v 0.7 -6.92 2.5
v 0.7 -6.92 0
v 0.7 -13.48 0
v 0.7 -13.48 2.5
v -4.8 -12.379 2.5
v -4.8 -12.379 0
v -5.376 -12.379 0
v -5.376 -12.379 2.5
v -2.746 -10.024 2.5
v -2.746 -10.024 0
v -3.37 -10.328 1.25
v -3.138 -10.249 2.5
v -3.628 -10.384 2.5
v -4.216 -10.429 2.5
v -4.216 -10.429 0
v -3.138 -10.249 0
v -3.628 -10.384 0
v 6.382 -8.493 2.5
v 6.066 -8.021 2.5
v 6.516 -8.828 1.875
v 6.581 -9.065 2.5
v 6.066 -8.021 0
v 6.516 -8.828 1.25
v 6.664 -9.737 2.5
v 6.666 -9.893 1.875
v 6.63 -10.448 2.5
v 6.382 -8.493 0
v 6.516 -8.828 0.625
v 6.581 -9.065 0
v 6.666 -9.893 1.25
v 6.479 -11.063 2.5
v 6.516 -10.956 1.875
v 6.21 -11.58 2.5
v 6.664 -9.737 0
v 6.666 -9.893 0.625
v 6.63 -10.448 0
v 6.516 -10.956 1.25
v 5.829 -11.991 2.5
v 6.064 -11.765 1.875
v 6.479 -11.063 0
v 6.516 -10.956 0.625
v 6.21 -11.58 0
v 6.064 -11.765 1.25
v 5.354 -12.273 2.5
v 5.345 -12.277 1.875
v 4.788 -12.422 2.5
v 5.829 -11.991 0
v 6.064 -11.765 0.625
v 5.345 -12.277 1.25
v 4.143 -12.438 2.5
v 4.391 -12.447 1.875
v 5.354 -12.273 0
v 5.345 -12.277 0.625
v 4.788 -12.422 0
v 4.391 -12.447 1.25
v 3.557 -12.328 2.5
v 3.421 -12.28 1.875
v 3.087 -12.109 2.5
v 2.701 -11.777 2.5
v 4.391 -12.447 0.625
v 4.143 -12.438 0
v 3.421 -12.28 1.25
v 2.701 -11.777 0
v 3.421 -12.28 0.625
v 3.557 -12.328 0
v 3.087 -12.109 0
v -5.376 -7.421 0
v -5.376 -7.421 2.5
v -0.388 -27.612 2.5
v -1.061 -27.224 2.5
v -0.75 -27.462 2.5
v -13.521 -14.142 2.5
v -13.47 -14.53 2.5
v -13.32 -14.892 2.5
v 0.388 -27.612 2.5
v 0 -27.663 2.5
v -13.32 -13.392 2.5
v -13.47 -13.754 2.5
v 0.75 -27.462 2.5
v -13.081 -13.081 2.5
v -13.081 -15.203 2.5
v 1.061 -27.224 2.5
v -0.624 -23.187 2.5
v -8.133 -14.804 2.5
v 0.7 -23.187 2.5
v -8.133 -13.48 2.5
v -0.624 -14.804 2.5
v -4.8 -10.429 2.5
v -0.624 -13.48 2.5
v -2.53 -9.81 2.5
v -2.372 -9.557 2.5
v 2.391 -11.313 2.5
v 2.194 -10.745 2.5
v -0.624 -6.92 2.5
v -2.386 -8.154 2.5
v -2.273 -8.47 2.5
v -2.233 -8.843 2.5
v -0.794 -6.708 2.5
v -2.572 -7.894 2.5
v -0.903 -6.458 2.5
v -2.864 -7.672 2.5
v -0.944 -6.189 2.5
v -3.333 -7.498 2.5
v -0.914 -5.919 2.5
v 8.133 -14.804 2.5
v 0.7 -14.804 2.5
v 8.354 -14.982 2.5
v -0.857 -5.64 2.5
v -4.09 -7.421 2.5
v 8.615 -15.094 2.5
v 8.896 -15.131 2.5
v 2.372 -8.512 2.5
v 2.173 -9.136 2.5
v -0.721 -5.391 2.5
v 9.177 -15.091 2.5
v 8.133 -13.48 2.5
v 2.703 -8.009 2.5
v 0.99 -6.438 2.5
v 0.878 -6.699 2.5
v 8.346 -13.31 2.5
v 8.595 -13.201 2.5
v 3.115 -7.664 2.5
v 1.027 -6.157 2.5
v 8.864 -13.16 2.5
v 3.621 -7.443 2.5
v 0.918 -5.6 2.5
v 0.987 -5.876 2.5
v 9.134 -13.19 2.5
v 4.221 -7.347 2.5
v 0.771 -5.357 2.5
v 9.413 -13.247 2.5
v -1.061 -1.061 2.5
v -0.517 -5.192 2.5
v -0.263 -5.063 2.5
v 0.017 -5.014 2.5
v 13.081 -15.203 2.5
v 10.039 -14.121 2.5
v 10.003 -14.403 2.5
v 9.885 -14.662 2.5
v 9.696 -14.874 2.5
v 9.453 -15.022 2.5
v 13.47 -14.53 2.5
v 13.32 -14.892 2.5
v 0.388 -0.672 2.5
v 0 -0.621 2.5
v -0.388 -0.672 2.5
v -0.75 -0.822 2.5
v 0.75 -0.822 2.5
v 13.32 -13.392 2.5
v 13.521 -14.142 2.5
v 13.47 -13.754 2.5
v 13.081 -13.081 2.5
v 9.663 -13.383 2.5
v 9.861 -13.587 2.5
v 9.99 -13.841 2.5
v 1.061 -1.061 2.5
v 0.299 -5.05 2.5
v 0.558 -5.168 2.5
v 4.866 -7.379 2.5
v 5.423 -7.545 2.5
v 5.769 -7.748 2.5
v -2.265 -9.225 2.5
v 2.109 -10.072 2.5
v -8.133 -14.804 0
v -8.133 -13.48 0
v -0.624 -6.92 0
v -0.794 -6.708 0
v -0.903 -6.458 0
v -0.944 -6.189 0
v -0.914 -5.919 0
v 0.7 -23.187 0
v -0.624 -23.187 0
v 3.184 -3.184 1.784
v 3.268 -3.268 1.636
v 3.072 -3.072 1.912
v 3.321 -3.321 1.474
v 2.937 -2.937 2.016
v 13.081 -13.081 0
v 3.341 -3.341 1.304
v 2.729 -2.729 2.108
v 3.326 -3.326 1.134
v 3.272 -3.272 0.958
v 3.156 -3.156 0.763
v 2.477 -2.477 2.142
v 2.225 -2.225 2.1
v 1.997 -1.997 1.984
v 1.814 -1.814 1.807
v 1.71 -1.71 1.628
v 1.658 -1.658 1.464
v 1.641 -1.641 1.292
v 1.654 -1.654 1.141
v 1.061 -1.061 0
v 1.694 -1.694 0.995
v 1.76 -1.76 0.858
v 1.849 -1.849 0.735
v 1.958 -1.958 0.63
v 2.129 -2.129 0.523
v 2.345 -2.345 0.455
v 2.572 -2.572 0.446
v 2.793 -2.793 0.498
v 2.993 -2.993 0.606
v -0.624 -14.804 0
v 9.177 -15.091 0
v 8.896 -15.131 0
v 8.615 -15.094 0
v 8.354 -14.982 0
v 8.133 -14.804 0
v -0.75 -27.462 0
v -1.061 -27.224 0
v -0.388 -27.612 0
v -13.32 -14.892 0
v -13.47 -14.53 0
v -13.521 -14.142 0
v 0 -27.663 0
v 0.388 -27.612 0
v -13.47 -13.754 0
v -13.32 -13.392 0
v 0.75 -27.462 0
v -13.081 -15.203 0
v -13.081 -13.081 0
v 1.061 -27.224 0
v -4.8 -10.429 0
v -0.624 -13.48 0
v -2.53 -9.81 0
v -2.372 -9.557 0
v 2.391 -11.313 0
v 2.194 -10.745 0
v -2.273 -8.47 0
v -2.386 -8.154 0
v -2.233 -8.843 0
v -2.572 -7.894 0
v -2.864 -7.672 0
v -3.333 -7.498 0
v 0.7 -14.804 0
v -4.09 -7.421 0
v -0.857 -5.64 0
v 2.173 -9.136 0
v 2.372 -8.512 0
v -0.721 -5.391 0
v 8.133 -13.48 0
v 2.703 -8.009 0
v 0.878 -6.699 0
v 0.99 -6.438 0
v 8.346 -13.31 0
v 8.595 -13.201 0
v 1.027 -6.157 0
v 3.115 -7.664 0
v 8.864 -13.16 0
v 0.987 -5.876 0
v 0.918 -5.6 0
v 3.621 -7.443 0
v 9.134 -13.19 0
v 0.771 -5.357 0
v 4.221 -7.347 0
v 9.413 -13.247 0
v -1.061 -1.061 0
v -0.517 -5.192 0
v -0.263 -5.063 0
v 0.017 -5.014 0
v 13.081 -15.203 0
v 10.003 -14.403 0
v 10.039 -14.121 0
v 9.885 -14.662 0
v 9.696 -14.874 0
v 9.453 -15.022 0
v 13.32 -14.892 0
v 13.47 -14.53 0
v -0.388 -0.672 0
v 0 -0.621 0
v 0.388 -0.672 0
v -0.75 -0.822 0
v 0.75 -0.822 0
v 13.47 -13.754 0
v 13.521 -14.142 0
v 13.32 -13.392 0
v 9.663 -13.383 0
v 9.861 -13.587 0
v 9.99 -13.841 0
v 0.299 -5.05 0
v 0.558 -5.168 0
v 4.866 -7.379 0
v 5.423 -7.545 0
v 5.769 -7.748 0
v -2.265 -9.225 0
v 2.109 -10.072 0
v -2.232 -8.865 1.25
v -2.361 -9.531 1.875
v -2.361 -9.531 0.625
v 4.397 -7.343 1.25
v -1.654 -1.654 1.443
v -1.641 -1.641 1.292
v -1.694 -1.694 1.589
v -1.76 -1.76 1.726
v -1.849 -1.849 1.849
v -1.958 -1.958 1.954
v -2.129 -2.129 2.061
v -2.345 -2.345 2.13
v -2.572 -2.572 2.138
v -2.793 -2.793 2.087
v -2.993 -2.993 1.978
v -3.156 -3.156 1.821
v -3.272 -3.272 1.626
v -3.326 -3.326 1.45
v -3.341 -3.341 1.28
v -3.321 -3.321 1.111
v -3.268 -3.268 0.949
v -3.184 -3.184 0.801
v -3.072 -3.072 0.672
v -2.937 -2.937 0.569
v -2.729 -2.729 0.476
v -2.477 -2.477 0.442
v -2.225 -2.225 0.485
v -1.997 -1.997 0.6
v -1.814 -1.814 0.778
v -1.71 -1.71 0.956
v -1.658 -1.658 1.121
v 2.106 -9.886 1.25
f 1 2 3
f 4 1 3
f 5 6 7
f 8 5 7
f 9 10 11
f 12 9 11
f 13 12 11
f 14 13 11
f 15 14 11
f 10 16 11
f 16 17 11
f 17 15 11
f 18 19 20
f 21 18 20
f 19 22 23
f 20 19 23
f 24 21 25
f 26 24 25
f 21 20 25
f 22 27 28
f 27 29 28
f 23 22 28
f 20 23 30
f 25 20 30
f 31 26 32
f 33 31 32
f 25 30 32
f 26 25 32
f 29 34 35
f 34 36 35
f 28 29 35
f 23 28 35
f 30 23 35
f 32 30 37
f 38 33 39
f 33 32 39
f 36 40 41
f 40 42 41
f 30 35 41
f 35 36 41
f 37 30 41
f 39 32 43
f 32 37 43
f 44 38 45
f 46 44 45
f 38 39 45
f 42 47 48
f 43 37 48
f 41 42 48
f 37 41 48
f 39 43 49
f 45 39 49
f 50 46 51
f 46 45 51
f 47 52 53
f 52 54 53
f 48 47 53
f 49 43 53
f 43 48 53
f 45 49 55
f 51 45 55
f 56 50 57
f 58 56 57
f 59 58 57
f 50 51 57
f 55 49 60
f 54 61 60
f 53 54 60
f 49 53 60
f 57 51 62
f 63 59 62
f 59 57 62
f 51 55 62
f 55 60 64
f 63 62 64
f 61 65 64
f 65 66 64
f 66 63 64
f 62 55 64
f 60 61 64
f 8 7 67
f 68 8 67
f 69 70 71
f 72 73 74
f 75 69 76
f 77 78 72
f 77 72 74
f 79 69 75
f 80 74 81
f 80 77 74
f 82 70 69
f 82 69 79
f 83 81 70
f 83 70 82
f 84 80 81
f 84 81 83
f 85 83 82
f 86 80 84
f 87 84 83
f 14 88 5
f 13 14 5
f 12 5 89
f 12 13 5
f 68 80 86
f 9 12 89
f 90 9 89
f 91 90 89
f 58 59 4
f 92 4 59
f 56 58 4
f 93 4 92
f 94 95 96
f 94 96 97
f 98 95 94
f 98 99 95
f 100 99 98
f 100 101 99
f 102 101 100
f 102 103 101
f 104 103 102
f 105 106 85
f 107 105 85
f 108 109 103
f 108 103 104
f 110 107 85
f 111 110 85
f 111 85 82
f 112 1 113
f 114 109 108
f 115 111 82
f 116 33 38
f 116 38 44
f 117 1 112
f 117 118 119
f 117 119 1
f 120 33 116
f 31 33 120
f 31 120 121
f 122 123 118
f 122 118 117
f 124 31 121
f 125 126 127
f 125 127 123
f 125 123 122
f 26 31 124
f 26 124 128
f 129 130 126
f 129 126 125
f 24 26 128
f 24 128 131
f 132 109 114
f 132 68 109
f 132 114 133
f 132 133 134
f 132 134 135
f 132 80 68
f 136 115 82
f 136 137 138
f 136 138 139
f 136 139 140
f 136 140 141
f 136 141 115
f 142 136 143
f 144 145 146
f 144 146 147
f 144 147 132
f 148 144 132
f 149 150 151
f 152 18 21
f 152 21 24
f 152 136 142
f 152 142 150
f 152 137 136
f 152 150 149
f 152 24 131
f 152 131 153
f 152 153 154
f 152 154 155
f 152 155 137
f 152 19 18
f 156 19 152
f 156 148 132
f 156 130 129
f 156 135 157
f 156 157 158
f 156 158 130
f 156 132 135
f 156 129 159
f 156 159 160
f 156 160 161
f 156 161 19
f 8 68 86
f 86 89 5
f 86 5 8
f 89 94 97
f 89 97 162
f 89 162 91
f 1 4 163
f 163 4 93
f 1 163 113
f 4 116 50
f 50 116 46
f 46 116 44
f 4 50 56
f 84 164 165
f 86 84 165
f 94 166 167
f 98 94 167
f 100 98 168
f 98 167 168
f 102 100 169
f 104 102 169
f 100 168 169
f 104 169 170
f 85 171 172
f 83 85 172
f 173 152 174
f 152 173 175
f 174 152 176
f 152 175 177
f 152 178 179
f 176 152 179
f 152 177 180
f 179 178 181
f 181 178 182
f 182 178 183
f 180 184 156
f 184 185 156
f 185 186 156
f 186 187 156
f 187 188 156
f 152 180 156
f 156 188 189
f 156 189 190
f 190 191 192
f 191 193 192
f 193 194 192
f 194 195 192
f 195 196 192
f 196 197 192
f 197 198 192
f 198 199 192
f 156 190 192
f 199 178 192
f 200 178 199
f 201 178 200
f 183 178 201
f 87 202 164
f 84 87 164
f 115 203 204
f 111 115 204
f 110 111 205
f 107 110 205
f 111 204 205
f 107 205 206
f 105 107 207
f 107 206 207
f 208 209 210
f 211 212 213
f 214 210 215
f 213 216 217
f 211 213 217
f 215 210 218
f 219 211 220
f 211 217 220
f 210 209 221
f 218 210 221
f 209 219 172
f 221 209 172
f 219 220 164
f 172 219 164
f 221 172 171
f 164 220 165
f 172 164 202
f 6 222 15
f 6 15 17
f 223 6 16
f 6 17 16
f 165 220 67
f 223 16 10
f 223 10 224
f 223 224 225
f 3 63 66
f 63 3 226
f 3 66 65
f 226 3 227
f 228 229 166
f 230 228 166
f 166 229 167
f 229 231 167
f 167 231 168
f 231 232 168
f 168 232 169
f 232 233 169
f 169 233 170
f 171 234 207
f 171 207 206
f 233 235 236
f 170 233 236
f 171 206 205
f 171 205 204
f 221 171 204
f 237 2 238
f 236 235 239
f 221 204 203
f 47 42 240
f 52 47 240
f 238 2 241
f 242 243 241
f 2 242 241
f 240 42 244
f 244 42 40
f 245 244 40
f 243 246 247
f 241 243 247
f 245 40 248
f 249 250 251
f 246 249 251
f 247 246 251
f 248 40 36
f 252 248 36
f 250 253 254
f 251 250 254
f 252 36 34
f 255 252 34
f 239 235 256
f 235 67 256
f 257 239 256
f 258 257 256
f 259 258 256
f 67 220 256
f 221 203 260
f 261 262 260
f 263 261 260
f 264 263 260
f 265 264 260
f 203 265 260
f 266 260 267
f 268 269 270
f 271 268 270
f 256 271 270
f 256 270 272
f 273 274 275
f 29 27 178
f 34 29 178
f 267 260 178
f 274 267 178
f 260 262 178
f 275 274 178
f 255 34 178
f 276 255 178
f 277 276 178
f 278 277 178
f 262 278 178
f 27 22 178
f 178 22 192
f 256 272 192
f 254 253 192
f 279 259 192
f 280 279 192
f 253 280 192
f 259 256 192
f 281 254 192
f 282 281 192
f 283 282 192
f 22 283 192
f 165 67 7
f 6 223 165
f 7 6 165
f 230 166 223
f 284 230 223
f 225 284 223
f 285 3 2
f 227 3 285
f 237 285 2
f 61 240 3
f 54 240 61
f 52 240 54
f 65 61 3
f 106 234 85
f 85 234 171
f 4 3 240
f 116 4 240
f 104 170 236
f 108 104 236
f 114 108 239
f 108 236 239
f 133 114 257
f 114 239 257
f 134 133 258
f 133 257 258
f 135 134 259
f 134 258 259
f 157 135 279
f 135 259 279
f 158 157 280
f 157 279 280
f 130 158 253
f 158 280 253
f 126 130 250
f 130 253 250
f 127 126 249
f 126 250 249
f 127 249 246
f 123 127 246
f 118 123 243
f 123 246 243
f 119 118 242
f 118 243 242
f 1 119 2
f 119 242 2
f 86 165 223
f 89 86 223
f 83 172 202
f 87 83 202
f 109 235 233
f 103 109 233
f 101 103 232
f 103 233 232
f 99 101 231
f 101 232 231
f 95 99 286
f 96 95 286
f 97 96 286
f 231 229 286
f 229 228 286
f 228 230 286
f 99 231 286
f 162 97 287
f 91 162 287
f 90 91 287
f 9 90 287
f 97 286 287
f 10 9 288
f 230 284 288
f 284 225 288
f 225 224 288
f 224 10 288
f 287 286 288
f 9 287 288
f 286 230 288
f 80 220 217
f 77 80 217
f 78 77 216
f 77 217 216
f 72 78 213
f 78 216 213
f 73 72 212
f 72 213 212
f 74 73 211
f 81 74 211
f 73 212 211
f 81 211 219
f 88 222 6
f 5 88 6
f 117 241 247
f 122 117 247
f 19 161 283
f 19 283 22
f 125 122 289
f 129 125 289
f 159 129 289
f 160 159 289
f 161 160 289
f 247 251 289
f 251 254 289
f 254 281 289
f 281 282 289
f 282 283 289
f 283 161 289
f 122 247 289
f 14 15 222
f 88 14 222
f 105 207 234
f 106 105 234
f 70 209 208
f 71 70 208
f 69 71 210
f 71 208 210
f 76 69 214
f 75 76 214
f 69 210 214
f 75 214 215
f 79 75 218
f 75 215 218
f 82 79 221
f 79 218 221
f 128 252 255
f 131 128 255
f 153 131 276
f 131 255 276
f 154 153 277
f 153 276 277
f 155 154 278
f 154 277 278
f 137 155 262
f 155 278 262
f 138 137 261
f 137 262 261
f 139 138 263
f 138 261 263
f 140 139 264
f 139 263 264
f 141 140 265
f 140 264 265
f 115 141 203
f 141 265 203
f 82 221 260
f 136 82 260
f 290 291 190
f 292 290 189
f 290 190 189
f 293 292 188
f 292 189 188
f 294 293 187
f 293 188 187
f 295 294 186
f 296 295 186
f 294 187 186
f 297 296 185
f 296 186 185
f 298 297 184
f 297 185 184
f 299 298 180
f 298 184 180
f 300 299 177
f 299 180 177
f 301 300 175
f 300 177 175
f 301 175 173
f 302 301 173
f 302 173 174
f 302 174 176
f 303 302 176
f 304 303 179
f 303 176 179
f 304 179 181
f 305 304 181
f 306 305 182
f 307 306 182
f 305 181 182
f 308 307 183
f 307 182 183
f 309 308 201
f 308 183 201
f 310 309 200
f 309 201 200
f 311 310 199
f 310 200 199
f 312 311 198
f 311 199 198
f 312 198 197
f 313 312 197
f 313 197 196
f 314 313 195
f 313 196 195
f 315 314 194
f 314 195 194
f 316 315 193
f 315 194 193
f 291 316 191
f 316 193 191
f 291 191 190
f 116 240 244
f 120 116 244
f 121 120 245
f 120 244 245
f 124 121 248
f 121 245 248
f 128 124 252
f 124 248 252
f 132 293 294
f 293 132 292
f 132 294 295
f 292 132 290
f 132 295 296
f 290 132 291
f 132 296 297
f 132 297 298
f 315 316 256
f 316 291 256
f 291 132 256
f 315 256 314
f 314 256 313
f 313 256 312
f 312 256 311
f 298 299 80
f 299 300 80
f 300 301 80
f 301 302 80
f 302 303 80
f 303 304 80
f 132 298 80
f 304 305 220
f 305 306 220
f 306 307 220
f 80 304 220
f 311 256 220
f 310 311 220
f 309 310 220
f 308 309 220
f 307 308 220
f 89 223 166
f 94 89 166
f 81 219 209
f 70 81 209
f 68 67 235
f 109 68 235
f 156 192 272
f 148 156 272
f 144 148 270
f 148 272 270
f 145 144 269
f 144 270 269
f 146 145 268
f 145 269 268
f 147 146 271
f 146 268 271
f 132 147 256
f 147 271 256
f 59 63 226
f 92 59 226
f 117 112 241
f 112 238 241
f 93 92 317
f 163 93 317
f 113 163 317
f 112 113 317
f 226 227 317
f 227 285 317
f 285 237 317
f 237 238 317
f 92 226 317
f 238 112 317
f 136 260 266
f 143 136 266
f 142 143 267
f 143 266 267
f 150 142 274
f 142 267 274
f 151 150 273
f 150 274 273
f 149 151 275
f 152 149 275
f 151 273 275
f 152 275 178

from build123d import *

# Parameters (mm, degrees)
F1_DEPTH = 2.5
F2_R     = 0.85
F3_DEPTH = 12.5


with BuildPart() as f1:
    # F0 (on Top) → F1 (new body)
    with BuildSketch(Plane.XY):
        with BuildLine():
            Line((13.081475452, -13.081475452), (1.0606601718, -1.0606601718))
            ThreePointArc((1.0606601718, -1.0606601718), (0, -0.6213203436), (-1.0606601718, -1.0606601718))
            Line((-1.0606601718, -1.0606601718), (-13.081475452, -13.081475452))
            ThreePointArc((-13.081475452, -13.081475452), (-13.5208152802, -14.1421356237), (-13.081475452, -15.2027957955))
            Line((-13.081475452, -15.2027957955), (-1.0606601718, -27.2236110757))
            ThreePointArc((-1.0606601718, -27.2236110757), (0, -27.6629509039), (1.0606601718, -27.2236110757))
            Line((1.0606601718, -27.2236110757), (13.081475452, -15.2027957955))
            ThreePointArc((13.081475452, -15.2027957955), (13.5208152802, -14.1421356237), (13.081475452, -13.081475452))
        make_face()
        with BuildLine():
            add(Edge.make_bspline(
                [(-4.0900345447, -7.4211291907), (-2.2323956558, -7.4211291907), (-2.2323956558, -8.8653566212)],
                knots=[0, 0, 0, 1, 1, 1], degree=2))
            add(Edge.make_bspline(
                [(-2.2323956558, -8.8653566212), (-2.2323956558, -9.6183948157), (-2.7461760377, -10.0236682532)],
                knots=[0, 0, 0, 1, 1, 1], degree=2))
            add(Edge.make_bspline(
                [(-2.7461760377, -10.0236682532), (-3.2599564197, -10.4289416907), (-4.2159026002, -10.4289416907)],
                knots=[0, 0, 0, 1, 1, 1], degree=2))
            Line((-4.2159026002, -10.4289416907), (-4.7996699613, -10.4289416907))
            Line((-4.7996699613, -10.4289416907), (-4.7996699613, -12.3788114823))
            Line((-4.7996699613, -12.3788114823), (-5.3758418363, -12.3788114823))
            Line((-5.3758418363, -12.3788114823), (-5.3758418363, -7.4211291907))
            Line((-5.3758418363, -7.4211291907), (-4.0900345447, -7.4211291907))
        make_face(mode=Mode.SUBTRACT)
        with BuildLine():
            Line((-8.1334756687, -14.8039748892), (-8.1334756687, -13.4802963582))
            Line((-8.1334756687, -13.4802963582), (-0.6236797201, -13.4802963582))
            Line((-0.6236797201, -13.4802963582), (-0.6236797201, -6.9198086858))
            ThreePointArc((-0.6236797201, -6.9198086858), (-0.9032194318, -6.4583786209), (-0.9135835525, -5.9189782686))
            ThreePointArc((-0.9135835525, -5.9189782686), (0.0168397474, -5.0141534426), (0.9868078824, -5.876451129))
            ThreePointArc((0.9868078824, -5.876451129), (0.9900106564, -6.4384308628), (0.6999988109, -6.9198086858))
            Line((0.6999988109, -6.9198086858), (0.6999988109, -13.4802963582))
            Line((0.6999988109, -13.4802963582), (8.1334756687, -13.4802963582))
            ThreePointArc((8.1334756687, -13.4802963582), (8.5949057336, -13.2007566465), (9.134306086, -13.1903925258))
            ThreePointArc((9.134306086, -13.1903925258), (10.0391309119, -14.1208158258), (9.1768332255, -15.0907839607))
            ThreePointArc((9.1768332255, -15.0907839607), (8.6148534917, -15.0939867347), (8.1334756687, -14.8039748892))
            Line((8.1334756687, -14.8039748892), (0.6999988109, -14.8039748892))
            Line((0.6999988109, -14.8039748892), (0.6999988109, -23.1867600232))
            Line((0.6999988109, -23.1867600232), (-0.6236797201, -23.1867600232))
            Line((-0.6236797201, -23.1867600232), (-0.6236797201, -14.8039748892))
            Line((-0.6236797201, -14.8039748892), (-8.1334756687, -14.8039748892))
        make_face(mode=Mode.SUBTRACT)
        with BuildLine():
            add(Edge.make_bspline(
                [(6.0662657395, -8.0211739904), (6.6663091423, -8.6993423932), (6.6663091423, -9.8929187821)],
                knots=[0, 0, 0, 1, 1, 1], degree=2))
            add(Edge.make_bspline(
                [(6.6663091423, -9.8929187821), (6.6663091423, -11.0832399627), (6.0640956006, -11.7652061085)],
                knots=[0, 0, 0, 1, 1, 1], degree=2))
            add(Edge.make_bspline(
                [(6.0640956006, -11.7652061085), (5.4618820589, -12.4471722543), (4.3909185173, -12.4471722543)],
                knots=[0, 0, 0, 1, 1, 1], degree=2))
            add(Edge.make_bspline(
                [(4.3909185173, -12.4471722543), (3.2960834478, -12.4471722543), (2.7009228576, -11.7771418724)],
                knots=[0, 0, 0, 1, 1, 1], degree=2))
            add(Edge.make_bspline(
                [(2.7009228576, -11.7771418724), (2.1057622673, -11.1071114904), (2.1057622673, -9.8864083654)],
                knots=[0, 0, 0, 1, 1, 1], degree=2))
            add(Edge.make_bspline(
                [(2.1057622673, -9.8864083654), (2.1057622673, -8.6754708654), (2.7025504617, -8.0092382265)],
                knots=[0, 0, 0, 1, 1, 1], degree=2))
            add(Edge.make_bspline(
                [(2.7025504617, -8.0092382265), (3.2993386562, -7.3430055877), (4.3974289339, -7.3430055877)],
                knots=[0, 0, 0, 1, 1, 1], degree=2))
            add(Edge.make_bspline(
                [(4.3974289339, -7.3430055877), (5.4662223367, -7.3430055877), (6.0662657395, -8.0211739904)],
                knots=[0, 0, 0, 1, 1, 1], degree=2))
        make_face(mode=Mode.SUBTRACT)
    extrude(amount=F1_DEPTH)

    # F2 (on Right) → F3 (cut, symmetric)
    with BuildSketch(Plane.YZ):
        with Locations((-2.4908210296, 1.292226194)):
            Circle(F2_R)
    extrude(amount=F3_DEPTH, both=True, mode=Mode.SUBTRACT)


solid = f1.part
